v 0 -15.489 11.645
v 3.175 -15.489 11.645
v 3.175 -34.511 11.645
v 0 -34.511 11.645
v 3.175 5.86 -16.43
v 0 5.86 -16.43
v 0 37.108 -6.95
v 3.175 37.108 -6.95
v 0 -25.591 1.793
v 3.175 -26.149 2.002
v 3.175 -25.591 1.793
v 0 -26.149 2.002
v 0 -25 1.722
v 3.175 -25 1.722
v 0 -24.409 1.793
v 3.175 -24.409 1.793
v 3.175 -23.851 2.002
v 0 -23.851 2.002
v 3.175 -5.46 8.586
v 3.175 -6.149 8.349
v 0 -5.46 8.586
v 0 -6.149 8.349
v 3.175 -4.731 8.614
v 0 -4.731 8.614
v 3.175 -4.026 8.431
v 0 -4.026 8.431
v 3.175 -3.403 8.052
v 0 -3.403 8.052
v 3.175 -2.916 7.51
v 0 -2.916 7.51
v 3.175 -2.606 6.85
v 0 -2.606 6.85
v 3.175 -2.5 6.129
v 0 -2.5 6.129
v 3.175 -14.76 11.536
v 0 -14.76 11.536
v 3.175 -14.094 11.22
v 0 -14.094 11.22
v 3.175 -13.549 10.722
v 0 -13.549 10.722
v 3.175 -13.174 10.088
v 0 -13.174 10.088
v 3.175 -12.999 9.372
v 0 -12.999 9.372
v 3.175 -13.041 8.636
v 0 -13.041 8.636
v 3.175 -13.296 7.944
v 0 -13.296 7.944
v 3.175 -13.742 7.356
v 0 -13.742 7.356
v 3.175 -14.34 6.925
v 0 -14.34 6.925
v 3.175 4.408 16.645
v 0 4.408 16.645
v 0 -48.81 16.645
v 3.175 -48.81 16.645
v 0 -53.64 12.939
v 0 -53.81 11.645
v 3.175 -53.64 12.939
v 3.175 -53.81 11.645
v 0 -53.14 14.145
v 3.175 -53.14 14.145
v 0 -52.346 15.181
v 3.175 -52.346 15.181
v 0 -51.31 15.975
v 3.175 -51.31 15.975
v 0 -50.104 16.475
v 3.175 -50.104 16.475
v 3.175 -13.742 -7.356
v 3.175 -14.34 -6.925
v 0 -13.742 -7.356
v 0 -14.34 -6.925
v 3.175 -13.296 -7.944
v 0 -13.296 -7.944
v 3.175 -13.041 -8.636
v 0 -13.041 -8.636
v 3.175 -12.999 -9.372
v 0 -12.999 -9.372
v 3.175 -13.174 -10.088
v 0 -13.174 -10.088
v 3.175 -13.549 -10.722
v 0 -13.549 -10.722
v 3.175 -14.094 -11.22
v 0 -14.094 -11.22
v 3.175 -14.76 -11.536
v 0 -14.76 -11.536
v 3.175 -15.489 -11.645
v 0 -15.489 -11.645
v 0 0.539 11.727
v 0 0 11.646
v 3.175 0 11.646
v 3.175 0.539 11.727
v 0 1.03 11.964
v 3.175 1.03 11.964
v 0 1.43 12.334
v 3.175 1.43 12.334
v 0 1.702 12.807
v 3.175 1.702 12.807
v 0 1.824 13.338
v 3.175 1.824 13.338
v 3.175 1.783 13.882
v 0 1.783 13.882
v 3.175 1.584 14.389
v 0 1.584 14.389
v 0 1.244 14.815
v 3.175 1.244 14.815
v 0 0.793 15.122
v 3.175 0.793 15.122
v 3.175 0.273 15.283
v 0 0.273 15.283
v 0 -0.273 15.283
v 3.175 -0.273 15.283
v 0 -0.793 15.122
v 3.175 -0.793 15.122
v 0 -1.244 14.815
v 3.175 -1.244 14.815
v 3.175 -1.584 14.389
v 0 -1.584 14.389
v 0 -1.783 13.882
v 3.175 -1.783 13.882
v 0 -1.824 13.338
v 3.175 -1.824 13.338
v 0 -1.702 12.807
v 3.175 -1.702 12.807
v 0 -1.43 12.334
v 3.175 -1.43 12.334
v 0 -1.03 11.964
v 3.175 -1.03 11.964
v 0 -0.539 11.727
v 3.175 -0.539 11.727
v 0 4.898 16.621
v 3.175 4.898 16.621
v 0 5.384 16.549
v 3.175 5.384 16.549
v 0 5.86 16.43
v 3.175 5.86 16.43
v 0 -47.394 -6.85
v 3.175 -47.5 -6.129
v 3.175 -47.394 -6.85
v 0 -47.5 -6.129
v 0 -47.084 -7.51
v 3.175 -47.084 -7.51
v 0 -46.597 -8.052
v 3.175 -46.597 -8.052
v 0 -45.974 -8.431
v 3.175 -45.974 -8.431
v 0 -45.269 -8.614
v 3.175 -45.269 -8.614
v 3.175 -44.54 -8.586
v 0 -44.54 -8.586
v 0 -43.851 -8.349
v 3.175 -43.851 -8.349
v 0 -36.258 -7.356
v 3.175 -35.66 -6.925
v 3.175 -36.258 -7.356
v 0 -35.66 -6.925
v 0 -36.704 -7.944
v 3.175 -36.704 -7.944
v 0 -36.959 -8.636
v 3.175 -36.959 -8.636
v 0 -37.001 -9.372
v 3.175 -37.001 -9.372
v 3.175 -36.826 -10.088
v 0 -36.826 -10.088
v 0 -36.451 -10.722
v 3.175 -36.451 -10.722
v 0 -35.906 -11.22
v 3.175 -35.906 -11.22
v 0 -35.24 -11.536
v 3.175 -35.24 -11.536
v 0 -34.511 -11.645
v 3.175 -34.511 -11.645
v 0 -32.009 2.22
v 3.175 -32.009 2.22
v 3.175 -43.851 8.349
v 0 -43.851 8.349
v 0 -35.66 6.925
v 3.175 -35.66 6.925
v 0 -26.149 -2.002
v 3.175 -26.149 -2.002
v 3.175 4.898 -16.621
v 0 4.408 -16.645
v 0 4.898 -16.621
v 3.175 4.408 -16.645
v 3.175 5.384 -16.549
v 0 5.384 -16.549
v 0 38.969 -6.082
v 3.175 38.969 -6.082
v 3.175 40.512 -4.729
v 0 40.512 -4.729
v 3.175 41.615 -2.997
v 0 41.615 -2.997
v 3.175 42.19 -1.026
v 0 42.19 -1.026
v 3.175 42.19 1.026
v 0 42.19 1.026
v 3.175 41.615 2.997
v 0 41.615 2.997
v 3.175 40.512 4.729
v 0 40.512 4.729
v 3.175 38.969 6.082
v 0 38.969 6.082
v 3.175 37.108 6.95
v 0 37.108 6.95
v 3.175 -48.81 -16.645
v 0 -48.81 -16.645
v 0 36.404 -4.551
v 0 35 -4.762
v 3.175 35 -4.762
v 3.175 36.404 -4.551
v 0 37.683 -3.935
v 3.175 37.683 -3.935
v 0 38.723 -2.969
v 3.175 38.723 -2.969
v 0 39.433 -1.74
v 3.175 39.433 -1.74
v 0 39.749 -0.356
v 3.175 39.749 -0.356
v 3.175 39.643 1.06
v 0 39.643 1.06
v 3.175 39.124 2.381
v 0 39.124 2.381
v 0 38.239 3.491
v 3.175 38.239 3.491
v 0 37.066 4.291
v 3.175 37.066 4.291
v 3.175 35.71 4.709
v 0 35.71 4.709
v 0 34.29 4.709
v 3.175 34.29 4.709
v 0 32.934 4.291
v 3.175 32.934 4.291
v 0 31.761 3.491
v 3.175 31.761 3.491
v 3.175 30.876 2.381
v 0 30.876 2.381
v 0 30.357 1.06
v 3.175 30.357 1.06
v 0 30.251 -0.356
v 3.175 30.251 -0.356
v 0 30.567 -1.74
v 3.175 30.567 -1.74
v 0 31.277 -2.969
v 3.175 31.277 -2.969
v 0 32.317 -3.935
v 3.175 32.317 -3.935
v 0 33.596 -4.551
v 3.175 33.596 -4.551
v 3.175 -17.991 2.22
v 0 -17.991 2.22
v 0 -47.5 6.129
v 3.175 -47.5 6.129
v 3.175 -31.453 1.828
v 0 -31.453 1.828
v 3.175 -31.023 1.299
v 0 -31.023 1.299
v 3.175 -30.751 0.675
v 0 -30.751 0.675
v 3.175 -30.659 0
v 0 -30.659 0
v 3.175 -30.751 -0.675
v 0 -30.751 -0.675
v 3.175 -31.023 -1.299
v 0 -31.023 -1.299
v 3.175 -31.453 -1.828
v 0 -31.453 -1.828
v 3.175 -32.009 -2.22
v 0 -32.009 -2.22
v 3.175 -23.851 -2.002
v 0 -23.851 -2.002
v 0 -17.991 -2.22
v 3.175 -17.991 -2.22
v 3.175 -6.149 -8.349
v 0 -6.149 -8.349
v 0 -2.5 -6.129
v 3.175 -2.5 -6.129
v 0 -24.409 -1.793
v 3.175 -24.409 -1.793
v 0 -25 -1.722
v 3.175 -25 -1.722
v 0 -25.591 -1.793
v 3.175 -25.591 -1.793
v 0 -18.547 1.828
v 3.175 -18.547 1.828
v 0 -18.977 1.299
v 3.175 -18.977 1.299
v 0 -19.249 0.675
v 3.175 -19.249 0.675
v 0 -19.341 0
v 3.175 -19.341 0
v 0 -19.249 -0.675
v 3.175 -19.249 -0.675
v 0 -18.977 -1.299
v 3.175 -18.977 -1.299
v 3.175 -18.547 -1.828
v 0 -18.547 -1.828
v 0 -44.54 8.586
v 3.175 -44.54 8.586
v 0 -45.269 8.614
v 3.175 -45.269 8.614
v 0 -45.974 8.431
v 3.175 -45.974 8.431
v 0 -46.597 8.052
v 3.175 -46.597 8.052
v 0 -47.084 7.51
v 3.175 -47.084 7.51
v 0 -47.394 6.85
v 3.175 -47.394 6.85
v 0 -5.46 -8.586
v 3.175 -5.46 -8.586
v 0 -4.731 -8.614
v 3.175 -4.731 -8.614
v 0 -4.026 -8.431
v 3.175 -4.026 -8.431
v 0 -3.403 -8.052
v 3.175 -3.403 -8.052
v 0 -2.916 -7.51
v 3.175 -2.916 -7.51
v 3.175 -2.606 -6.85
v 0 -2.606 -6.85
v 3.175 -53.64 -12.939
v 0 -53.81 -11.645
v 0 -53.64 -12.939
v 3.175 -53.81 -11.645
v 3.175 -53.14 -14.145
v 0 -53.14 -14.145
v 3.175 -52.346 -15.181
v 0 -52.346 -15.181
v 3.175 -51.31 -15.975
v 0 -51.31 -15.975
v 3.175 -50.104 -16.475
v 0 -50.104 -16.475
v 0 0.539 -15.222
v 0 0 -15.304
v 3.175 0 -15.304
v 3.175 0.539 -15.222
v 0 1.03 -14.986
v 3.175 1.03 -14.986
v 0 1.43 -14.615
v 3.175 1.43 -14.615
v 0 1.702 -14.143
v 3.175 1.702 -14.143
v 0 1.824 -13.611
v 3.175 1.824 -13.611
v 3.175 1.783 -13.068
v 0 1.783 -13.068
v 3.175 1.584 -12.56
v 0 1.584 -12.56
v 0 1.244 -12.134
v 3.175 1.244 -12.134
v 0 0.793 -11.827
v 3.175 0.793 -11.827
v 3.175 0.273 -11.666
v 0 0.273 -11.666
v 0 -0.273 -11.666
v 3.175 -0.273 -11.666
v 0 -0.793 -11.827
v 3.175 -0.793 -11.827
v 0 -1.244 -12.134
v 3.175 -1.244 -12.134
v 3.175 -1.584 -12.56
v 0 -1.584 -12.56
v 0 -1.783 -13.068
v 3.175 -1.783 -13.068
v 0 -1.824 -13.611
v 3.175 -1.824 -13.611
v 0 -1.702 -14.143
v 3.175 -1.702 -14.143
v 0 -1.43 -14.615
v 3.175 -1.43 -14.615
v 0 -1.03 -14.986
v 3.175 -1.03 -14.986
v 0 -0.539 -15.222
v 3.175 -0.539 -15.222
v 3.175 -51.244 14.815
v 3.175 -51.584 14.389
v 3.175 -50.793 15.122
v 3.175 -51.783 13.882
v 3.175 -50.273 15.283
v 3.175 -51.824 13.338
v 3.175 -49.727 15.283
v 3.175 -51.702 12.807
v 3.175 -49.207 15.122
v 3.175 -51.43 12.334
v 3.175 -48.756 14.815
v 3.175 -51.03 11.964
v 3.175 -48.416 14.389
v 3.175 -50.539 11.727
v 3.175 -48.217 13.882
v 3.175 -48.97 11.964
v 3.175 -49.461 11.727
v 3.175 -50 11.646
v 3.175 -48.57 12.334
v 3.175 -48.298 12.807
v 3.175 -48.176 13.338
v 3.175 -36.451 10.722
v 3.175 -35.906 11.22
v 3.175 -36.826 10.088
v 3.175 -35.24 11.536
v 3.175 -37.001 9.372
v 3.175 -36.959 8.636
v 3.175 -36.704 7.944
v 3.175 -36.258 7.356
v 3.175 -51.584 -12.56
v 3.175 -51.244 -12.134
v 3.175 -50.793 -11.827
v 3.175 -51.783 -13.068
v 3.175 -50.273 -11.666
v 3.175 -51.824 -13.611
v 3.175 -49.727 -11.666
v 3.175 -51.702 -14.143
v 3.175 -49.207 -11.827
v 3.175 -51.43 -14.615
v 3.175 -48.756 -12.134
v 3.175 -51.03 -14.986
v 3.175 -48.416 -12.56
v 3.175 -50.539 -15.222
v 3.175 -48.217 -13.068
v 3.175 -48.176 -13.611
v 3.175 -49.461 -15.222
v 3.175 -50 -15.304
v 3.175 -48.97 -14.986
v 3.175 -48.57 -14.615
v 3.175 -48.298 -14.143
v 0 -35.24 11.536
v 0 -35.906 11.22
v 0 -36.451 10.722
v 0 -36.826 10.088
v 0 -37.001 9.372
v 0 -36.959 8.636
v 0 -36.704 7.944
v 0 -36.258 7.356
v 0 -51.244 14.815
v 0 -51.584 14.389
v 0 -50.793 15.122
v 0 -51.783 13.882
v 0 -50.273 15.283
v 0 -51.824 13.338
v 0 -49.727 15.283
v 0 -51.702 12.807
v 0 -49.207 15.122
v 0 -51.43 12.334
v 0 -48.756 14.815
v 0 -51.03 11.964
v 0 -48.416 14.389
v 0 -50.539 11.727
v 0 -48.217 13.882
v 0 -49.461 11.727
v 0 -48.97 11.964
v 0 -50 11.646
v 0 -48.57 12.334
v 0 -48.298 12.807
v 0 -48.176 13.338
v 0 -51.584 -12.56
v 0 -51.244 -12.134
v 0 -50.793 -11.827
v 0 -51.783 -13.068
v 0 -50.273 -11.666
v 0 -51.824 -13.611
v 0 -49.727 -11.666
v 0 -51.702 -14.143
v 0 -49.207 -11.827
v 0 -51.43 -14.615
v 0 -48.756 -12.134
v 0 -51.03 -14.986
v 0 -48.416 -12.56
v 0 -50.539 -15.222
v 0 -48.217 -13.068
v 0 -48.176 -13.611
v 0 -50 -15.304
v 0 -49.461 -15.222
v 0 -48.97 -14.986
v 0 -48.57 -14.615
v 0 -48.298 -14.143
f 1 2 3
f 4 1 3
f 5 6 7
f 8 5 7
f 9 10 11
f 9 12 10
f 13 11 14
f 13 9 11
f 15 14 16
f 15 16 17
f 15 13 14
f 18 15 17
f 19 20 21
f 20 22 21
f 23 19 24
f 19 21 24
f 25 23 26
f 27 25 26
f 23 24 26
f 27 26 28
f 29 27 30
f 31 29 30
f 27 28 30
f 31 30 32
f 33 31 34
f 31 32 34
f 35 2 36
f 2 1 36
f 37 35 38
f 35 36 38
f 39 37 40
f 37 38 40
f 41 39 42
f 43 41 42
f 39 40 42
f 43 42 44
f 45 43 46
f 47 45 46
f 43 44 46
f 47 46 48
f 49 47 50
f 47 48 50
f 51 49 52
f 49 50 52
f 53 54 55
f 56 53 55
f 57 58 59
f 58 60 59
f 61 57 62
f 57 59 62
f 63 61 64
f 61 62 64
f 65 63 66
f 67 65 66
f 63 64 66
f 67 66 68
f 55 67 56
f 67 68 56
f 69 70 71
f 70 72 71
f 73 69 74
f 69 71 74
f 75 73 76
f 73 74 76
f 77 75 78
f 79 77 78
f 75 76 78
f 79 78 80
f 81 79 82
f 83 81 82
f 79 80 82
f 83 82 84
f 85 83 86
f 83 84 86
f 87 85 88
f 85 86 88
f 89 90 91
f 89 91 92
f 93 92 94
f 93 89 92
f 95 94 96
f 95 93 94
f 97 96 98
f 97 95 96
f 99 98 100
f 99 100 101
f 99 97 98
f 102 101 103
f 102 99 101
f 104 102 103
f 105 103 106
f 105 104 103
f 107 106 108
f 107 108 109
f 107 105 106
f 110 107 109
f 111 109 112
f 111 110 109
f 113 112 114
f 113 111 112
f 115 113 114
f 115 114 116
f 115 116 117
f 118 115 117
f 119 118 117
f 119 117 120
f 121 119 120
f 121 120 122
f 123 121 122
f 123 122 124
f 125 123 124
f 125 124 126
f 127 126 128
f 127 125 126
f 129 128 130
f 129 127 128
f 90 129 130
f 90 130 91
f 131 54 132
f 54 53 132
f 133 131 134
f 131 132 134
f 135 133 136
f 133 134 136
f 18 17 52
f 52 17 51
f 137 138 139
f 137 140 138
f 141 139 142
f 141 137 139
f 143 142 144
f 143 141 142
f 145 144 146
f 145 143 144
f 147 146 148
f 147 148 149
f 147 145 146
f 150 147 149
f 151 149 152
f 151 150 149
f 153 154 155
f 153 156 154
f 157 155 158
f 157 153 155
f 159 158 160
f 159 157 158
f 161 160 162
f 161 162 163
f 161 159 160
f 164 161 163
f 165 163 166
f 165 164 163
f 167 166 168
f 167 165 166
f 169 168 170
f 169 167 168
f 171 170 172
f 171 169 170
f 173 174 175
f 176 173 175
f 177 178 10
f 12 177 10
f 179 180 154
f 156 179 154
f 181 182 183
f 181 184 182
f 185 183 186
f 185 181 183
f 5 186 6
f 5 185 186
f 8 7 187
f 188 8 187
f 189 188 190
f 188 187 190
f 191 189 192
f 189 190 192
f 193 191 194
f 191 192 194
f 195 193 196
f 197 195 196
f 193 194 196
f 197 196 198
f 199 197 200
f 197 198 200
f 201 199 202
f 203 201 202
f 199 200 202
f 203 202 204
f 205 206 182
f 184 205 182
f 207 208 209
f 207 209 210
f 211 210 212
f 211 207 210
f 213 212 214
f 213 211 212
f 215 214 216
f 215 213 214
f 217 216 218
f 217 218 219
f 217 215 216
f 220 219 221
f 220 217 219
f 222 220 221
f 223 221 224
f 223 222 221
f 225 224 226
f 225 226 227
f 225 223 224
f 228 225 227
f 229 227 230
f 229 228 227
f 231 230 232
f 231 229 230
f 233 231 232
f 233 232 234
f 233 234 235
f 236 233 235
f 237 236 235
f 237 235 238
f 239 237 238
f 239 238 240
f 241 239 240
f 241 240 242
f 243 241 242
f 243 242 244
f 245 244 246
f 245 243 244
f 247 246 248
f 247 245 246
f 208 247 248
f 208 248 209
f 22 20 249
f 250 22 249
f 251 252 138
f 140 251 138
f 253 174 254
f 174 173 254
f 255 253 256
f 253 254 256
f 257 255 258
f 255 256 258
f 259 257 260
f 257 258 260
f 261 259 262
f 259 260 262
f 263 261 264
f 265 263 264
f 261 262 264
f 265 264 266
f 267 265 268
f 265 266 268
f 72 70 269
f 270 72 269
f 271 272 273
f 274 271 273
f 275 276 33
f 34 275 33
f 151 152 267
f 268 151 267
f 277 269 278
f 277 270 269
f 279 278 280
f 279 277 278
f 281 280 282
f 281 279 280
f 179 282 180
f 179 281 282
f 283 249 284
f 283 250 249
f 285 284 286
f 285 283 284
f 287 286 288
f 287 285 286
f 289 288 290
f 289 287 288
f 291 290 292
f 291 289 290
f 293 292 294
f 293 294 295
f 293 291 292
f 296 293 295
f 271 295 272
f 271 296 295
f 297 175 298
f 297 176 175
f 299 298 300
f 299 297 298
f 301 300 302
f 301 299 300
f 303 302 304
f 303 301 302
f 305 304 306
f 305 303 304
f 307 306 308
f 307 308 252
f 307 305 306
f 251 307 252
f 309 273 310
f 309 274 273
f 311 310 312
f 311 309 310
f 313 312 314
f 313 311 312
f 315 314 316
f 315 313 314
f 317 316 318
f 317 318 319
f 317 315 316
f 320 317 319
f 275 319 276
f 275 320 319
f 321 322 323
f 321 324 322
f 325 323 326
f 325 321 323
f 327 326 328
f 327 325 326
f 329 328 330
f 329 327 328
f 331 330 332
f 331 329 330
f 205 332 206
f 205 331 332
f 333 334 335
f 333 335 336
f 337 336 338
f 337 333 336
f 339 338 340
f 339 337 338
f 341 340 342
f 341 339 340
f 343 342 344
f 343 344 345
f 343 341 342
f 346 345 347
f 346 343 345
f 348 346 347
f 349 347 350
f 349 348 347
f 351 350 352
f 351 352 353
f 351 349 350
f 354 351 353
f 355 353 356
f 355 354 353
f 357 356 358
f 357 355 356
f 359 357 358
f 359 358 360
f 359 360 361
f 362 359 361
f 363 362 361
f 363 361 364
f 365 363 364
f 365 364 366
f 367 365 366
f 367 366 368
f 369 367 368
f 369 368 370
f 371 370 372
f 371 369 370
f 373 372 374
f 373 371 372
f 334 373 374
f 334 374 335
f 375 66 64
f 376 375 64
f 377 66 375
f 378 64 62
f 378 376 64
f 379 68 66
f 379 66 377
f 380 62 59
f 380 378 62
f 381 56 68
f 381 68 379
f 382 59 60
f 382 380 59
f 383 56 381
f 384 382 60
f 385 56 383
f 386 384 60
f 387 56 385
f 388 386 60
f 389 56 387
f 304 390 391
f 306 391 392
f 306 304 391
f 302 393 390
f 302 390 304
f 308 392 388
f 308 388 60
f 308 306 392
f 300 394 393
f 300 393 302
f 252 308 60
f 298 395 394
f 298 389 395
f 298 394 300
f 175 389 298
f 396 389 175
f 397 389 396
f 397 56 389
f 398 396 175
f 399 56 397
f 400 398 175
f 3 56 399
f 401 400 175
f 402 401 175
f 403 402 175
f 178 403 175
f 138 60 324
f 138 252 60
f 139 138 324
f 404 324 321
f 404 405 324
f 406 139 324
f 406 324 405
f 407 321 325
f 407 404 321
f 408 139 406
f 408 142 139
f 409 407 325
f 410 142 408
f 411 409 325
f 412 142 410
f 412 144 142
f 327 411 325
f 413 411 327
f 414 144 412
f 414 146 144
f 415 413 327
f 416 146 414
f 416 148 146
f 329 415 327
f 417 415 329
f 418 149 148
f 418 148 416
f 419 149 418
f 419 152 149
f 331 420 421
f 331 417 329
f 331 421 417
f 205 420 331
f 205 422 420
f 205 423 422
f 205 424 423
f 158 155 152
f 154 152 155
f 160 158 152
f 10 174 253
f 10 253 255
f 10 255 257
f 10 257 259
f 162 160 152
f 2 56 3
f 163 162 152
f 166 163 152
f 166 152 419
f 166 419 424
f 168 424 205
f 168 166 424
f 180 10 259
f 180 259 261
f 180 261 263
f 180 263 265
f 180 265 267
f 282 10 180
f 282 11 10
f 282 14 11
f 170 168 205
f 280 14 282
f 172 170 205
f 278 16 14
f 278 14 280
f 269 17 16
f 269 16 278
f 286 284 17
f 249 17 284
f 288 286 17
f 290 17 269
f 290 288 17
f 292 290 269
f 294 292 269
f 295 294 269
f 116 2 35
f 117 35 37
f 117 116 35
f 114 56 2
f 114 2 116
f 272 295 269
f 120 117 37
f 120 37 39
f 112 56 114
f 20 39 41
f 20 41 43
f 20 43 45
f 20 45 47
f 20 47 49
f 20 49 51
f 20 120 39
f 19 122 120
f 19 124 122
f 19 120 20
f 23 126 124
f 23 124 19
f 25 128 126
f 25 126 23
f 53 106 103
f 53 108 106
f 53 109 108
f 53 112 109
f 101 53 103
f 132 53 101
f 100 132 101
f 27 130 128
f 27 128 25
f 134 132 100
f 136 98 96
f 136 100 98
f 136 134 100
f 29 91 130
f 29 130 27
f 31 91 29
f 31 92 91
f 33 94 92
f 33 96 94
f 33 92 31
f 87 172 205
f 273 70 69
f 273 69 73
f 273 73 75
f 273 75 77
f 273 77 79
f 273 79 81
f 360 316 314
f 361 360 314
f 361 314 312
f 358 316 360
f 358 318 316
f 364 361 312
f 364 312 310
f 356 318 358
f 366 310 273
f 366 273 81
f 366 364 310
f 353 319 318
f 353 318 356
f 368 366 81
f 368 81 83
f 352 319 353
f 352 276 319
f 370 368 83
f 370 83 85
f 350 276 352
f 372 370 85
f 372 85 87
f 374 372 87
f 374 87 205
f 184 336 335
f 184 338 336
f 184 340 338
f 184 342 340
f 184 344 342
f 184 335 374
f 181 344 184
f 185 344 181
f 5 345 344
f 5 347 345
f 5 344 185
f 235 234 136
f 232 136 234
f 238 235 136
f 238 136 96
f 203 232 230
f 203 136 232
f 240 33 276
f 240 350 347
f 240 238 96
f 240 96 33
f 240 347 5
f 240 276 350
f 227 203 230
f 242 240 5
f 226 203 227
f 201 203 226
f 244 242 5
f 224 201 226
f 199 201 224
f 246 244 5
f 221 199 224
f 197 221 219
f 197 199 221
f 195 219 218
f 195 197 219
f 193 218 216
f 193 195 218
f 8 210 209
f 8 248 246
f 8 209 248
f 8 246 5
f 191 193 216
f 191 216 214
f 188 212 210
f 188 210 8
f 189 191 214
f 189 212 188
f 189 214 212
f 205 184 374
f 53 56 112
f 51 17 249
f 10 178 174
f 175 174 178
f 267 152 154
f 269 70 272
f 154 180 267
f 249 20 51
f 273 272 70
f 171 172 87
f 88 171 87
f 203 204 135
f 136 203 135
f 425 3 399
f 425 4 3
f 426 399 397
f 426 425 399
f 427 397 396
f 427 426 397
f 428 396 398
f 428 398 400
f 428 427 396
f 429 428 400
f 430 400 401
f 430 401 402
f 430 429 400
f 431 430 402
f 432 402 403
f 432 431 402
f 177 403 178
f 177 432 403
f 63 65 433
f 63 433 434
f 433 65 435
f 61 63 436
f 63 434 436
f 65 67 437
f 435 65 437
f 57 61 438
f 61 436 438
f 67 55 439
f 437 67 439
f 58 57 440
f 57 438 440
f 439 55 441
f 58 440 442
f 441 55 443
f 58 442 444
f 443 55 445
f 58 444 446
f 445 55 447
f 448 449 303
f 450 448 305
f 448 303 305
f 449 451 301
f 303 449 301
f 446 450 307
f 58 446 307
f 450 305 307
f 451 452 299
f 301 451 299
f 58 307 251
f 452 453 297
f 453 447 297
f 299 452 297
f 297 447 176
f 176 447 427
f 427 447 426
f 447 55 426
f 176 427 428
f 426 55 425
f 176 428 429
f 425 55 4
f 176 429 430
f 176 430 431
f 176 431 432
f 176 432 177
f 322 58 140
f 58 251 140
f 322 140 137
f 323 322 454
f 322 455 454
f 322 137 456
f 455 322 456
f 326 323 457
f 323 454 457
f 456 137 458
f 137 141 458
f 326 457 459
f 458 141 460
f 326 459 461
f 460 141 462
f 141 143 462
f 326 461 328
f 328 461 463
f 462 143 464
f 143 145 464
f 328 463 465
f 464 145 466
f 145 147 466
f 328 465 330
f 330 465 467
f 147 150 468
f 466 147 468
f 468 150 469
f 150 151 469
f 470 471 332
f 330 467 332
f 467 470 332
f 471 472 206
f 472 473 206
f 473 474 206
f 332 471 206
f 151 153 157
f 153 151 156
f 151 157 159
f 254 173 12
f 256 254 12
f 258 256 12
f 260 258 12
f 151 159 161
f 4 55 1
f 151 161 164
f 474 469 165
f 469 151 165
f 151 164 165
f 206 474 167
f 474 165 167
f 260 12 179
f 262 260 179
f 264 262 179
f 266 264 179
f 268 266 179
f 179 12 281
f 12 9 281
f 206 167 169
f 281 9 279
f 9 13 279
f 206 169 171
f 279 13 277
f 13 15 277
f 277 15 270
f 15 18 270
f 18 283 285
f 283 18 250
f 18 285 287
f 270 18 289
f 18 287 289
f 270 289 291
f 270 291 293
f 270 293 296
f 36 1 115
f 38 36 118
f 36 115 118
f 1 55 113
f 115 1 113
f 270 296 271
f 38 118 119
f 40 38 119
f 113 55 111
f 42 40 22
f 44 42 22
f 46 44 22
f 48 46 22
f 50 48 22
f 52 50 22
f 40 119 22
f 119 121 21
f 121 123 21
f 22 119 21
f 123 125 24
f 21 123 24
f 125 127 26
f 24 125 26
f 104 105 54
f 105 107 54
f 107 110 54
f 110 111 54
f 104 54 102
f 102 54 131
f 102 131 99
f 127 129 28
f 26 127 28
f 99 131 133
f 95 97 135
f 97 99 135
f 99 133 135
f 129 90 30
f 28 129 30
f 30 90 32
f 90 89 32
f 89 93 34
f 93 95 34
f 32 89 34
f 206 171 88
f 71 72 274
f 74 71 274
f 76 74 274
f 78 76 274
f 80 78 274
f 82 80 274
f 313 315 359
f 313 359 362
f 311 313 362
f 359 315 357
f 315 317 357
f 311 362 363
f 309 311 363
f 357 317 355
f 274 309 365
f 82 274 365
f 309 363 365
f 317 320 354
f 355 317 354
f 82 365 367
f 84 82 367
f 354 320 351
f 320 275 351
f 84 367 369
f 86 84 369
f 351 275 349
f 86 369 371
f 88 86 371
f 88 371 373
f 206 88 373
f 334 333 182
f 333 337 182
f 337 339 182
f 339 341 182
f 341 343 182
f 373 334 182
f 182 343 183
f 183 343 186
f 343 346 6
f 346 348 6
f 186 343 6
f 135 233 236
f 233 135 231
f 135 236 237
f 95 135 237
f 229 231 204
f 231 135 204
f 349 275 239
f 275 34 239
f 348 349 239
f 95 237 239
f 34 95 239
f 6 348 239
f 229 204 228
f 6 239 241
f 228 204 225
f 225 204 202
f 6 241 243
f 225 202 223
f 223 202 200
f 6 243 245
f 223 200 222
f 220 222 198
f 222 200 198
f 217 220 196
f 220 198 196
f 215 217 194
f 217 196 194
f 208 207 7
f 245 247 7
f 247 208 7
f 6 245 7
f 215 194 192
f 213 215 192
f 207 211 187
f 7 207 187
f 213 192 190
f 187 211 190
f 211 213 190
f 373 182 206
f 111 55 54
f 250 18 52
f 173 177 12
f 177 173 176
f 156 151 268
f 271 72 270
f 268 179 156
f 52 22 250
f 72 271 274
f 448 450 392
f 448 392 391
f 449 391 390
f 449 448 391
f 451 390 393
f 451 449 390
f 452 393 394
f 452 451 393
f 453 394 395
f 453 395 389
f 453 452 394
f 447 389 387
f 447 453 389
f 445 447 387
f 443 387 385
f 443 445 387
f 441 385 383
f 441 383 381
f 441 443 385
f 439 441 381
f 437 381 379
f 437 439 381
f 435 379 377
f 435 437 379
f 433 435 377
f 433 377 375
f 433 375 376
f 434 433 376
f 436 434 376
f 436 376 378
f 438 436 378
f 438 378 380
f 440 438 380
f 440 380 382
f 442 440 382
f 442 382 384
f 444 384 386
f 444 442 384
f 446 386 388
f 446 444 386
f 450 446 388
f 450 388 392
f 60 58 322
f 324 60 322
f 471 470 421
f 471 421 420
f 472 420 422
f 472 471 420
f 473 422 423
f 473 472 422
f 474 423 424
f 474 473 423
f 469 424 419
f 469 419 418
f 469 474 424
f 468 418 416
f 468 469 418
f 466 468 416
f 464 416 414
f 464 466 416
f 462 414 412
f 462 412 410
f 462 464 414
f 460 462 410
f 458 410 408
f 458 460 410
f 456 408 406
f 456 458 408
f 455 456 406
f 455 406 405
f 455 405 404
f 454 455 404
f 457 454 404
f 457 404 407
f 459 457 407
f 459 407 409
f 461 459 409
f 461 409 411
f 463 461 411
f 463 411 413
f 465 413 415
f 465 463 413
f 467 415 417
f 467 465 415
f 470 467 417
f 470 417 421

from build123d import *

# Parameters (mm, degrees)
SKETCH1_R           = 1.8288
SKETCH1_R_2         = 4.7625
BOSS_EXTRUDE1_DEPTH = 3.175
CUT_EXTRUDE1_DEPTH  = 57.415004653
FILLET1_R           = 2.5
FILLET2_R           = 5


with BuildPart() as part:
    # Sketch1 → Boss-Extrude1 (new body)
    with BuildSketch(Plane(origin=(0, 0, 0), x_dir=(0, 0, -1), z_dir=(1, 0, 0))):
        with BuildLine():
            Line((-16.645, -53.81), (16.645, -53.81))
            Line((16.645, -53.81), (16.645, 5.15))
            Line((16.645, 5.15), (6.94973031, 37.108353593))
            ThreePointArc((6.94973031, 37.108353593), (0, 42.2625), (-6.94973031, 37.108353593))
            Line((-6.94973031, 37.108353593), (-16.645, 5.15))
            Line((-16.645, 5.15), (-16.645, -53.81))
        make_face()
        with Locations((-13.4747, 0)):
            Circle(SKETCH1_R, mode=Mode.SUBTRACT)
        with Locations((0, 35)):
            Circle(SKETCH1_R_2, mode=Mode.SUBTRACT)
        with Locations((13.4747, 0)):
            Circle(SKETCH1_R, mode=Mode.SUBTRACT)
        with Locations((-13.4747, -50)):
            Circle(SKETCH1_R, mode=Mode.SUBTRACT)
        with Locations((13.4747, -50)):
            Circle(SKETCH1_R, mode=Mode.SUBTRACT)
    extrude(amount=BOSS_EXTRUDE1_DEPTH)

    # Sketch2 → Cut-Extrude1 (cut, through all)
    with BuildSketch(Plane(origin=(3.175, 0, 0), x_dir=(0, 0, -1), z_dir=(1, 0, 0))):
        Polygon((11.645, -5.219501679), (1.407493202, -25), (11.645, -44.780498321), align=None)
        Polygon((0, -27.719501679), (-10.237506798, -47.5), (10.237506798, -47.5), align=None)
        Polygon((-11.645, -5.219501679), (-11.645, -44.780498321), (-1.407493202, -25), align=None)
        Polygon((-10.237506798, -2.5), (0, -22.280498321), (10.237506798, -2.5), align=None)
    extrude(amount=-CUT_EXTRUDE1_DEPTH, mode=Mode.SUBTRACT)

    # Fillet1
    fillet1_edges = [part.edges().sort_by_distance(p)[0] for p in [
        (1.5875, -44.780498321, 11.645),
        (1.5875, -5.219501679, 11.645),
        (1.5875, -25, 1.407493202),
        (1.5875, -47.5, -10.237506798),
        (1.5875, -47.5, 10.237506798),
        (1.5875, -27.719501679, 0),
        (1.5875, -22.280498321, 0),
        (1.5875, -2.5, 10.237506798),
        (1.5875, -2.5, -10.237506798),
        (1.5875, -25, -1.407493202),
        (1.5875, -5.219501679, -11.645),
        (1.5875, -44.780498321, -11.645),
    ]]
    fillet(fillet1_edges, radius=FILLET1_R)

    # Fillet2
    fillet2_edges = [part.edges().sort_by_distance(p)[0] for p in [
        (1.5875, -53.81, -16.645),
        (1.5875, -53.81, 16.645),
        (1.5875, 5.15, 16.645),
        (1.5875, 5.15, -16.645),
    ]]
    fillet(fillet2_edges, radius=FILLET2_R)


solid = part.part
